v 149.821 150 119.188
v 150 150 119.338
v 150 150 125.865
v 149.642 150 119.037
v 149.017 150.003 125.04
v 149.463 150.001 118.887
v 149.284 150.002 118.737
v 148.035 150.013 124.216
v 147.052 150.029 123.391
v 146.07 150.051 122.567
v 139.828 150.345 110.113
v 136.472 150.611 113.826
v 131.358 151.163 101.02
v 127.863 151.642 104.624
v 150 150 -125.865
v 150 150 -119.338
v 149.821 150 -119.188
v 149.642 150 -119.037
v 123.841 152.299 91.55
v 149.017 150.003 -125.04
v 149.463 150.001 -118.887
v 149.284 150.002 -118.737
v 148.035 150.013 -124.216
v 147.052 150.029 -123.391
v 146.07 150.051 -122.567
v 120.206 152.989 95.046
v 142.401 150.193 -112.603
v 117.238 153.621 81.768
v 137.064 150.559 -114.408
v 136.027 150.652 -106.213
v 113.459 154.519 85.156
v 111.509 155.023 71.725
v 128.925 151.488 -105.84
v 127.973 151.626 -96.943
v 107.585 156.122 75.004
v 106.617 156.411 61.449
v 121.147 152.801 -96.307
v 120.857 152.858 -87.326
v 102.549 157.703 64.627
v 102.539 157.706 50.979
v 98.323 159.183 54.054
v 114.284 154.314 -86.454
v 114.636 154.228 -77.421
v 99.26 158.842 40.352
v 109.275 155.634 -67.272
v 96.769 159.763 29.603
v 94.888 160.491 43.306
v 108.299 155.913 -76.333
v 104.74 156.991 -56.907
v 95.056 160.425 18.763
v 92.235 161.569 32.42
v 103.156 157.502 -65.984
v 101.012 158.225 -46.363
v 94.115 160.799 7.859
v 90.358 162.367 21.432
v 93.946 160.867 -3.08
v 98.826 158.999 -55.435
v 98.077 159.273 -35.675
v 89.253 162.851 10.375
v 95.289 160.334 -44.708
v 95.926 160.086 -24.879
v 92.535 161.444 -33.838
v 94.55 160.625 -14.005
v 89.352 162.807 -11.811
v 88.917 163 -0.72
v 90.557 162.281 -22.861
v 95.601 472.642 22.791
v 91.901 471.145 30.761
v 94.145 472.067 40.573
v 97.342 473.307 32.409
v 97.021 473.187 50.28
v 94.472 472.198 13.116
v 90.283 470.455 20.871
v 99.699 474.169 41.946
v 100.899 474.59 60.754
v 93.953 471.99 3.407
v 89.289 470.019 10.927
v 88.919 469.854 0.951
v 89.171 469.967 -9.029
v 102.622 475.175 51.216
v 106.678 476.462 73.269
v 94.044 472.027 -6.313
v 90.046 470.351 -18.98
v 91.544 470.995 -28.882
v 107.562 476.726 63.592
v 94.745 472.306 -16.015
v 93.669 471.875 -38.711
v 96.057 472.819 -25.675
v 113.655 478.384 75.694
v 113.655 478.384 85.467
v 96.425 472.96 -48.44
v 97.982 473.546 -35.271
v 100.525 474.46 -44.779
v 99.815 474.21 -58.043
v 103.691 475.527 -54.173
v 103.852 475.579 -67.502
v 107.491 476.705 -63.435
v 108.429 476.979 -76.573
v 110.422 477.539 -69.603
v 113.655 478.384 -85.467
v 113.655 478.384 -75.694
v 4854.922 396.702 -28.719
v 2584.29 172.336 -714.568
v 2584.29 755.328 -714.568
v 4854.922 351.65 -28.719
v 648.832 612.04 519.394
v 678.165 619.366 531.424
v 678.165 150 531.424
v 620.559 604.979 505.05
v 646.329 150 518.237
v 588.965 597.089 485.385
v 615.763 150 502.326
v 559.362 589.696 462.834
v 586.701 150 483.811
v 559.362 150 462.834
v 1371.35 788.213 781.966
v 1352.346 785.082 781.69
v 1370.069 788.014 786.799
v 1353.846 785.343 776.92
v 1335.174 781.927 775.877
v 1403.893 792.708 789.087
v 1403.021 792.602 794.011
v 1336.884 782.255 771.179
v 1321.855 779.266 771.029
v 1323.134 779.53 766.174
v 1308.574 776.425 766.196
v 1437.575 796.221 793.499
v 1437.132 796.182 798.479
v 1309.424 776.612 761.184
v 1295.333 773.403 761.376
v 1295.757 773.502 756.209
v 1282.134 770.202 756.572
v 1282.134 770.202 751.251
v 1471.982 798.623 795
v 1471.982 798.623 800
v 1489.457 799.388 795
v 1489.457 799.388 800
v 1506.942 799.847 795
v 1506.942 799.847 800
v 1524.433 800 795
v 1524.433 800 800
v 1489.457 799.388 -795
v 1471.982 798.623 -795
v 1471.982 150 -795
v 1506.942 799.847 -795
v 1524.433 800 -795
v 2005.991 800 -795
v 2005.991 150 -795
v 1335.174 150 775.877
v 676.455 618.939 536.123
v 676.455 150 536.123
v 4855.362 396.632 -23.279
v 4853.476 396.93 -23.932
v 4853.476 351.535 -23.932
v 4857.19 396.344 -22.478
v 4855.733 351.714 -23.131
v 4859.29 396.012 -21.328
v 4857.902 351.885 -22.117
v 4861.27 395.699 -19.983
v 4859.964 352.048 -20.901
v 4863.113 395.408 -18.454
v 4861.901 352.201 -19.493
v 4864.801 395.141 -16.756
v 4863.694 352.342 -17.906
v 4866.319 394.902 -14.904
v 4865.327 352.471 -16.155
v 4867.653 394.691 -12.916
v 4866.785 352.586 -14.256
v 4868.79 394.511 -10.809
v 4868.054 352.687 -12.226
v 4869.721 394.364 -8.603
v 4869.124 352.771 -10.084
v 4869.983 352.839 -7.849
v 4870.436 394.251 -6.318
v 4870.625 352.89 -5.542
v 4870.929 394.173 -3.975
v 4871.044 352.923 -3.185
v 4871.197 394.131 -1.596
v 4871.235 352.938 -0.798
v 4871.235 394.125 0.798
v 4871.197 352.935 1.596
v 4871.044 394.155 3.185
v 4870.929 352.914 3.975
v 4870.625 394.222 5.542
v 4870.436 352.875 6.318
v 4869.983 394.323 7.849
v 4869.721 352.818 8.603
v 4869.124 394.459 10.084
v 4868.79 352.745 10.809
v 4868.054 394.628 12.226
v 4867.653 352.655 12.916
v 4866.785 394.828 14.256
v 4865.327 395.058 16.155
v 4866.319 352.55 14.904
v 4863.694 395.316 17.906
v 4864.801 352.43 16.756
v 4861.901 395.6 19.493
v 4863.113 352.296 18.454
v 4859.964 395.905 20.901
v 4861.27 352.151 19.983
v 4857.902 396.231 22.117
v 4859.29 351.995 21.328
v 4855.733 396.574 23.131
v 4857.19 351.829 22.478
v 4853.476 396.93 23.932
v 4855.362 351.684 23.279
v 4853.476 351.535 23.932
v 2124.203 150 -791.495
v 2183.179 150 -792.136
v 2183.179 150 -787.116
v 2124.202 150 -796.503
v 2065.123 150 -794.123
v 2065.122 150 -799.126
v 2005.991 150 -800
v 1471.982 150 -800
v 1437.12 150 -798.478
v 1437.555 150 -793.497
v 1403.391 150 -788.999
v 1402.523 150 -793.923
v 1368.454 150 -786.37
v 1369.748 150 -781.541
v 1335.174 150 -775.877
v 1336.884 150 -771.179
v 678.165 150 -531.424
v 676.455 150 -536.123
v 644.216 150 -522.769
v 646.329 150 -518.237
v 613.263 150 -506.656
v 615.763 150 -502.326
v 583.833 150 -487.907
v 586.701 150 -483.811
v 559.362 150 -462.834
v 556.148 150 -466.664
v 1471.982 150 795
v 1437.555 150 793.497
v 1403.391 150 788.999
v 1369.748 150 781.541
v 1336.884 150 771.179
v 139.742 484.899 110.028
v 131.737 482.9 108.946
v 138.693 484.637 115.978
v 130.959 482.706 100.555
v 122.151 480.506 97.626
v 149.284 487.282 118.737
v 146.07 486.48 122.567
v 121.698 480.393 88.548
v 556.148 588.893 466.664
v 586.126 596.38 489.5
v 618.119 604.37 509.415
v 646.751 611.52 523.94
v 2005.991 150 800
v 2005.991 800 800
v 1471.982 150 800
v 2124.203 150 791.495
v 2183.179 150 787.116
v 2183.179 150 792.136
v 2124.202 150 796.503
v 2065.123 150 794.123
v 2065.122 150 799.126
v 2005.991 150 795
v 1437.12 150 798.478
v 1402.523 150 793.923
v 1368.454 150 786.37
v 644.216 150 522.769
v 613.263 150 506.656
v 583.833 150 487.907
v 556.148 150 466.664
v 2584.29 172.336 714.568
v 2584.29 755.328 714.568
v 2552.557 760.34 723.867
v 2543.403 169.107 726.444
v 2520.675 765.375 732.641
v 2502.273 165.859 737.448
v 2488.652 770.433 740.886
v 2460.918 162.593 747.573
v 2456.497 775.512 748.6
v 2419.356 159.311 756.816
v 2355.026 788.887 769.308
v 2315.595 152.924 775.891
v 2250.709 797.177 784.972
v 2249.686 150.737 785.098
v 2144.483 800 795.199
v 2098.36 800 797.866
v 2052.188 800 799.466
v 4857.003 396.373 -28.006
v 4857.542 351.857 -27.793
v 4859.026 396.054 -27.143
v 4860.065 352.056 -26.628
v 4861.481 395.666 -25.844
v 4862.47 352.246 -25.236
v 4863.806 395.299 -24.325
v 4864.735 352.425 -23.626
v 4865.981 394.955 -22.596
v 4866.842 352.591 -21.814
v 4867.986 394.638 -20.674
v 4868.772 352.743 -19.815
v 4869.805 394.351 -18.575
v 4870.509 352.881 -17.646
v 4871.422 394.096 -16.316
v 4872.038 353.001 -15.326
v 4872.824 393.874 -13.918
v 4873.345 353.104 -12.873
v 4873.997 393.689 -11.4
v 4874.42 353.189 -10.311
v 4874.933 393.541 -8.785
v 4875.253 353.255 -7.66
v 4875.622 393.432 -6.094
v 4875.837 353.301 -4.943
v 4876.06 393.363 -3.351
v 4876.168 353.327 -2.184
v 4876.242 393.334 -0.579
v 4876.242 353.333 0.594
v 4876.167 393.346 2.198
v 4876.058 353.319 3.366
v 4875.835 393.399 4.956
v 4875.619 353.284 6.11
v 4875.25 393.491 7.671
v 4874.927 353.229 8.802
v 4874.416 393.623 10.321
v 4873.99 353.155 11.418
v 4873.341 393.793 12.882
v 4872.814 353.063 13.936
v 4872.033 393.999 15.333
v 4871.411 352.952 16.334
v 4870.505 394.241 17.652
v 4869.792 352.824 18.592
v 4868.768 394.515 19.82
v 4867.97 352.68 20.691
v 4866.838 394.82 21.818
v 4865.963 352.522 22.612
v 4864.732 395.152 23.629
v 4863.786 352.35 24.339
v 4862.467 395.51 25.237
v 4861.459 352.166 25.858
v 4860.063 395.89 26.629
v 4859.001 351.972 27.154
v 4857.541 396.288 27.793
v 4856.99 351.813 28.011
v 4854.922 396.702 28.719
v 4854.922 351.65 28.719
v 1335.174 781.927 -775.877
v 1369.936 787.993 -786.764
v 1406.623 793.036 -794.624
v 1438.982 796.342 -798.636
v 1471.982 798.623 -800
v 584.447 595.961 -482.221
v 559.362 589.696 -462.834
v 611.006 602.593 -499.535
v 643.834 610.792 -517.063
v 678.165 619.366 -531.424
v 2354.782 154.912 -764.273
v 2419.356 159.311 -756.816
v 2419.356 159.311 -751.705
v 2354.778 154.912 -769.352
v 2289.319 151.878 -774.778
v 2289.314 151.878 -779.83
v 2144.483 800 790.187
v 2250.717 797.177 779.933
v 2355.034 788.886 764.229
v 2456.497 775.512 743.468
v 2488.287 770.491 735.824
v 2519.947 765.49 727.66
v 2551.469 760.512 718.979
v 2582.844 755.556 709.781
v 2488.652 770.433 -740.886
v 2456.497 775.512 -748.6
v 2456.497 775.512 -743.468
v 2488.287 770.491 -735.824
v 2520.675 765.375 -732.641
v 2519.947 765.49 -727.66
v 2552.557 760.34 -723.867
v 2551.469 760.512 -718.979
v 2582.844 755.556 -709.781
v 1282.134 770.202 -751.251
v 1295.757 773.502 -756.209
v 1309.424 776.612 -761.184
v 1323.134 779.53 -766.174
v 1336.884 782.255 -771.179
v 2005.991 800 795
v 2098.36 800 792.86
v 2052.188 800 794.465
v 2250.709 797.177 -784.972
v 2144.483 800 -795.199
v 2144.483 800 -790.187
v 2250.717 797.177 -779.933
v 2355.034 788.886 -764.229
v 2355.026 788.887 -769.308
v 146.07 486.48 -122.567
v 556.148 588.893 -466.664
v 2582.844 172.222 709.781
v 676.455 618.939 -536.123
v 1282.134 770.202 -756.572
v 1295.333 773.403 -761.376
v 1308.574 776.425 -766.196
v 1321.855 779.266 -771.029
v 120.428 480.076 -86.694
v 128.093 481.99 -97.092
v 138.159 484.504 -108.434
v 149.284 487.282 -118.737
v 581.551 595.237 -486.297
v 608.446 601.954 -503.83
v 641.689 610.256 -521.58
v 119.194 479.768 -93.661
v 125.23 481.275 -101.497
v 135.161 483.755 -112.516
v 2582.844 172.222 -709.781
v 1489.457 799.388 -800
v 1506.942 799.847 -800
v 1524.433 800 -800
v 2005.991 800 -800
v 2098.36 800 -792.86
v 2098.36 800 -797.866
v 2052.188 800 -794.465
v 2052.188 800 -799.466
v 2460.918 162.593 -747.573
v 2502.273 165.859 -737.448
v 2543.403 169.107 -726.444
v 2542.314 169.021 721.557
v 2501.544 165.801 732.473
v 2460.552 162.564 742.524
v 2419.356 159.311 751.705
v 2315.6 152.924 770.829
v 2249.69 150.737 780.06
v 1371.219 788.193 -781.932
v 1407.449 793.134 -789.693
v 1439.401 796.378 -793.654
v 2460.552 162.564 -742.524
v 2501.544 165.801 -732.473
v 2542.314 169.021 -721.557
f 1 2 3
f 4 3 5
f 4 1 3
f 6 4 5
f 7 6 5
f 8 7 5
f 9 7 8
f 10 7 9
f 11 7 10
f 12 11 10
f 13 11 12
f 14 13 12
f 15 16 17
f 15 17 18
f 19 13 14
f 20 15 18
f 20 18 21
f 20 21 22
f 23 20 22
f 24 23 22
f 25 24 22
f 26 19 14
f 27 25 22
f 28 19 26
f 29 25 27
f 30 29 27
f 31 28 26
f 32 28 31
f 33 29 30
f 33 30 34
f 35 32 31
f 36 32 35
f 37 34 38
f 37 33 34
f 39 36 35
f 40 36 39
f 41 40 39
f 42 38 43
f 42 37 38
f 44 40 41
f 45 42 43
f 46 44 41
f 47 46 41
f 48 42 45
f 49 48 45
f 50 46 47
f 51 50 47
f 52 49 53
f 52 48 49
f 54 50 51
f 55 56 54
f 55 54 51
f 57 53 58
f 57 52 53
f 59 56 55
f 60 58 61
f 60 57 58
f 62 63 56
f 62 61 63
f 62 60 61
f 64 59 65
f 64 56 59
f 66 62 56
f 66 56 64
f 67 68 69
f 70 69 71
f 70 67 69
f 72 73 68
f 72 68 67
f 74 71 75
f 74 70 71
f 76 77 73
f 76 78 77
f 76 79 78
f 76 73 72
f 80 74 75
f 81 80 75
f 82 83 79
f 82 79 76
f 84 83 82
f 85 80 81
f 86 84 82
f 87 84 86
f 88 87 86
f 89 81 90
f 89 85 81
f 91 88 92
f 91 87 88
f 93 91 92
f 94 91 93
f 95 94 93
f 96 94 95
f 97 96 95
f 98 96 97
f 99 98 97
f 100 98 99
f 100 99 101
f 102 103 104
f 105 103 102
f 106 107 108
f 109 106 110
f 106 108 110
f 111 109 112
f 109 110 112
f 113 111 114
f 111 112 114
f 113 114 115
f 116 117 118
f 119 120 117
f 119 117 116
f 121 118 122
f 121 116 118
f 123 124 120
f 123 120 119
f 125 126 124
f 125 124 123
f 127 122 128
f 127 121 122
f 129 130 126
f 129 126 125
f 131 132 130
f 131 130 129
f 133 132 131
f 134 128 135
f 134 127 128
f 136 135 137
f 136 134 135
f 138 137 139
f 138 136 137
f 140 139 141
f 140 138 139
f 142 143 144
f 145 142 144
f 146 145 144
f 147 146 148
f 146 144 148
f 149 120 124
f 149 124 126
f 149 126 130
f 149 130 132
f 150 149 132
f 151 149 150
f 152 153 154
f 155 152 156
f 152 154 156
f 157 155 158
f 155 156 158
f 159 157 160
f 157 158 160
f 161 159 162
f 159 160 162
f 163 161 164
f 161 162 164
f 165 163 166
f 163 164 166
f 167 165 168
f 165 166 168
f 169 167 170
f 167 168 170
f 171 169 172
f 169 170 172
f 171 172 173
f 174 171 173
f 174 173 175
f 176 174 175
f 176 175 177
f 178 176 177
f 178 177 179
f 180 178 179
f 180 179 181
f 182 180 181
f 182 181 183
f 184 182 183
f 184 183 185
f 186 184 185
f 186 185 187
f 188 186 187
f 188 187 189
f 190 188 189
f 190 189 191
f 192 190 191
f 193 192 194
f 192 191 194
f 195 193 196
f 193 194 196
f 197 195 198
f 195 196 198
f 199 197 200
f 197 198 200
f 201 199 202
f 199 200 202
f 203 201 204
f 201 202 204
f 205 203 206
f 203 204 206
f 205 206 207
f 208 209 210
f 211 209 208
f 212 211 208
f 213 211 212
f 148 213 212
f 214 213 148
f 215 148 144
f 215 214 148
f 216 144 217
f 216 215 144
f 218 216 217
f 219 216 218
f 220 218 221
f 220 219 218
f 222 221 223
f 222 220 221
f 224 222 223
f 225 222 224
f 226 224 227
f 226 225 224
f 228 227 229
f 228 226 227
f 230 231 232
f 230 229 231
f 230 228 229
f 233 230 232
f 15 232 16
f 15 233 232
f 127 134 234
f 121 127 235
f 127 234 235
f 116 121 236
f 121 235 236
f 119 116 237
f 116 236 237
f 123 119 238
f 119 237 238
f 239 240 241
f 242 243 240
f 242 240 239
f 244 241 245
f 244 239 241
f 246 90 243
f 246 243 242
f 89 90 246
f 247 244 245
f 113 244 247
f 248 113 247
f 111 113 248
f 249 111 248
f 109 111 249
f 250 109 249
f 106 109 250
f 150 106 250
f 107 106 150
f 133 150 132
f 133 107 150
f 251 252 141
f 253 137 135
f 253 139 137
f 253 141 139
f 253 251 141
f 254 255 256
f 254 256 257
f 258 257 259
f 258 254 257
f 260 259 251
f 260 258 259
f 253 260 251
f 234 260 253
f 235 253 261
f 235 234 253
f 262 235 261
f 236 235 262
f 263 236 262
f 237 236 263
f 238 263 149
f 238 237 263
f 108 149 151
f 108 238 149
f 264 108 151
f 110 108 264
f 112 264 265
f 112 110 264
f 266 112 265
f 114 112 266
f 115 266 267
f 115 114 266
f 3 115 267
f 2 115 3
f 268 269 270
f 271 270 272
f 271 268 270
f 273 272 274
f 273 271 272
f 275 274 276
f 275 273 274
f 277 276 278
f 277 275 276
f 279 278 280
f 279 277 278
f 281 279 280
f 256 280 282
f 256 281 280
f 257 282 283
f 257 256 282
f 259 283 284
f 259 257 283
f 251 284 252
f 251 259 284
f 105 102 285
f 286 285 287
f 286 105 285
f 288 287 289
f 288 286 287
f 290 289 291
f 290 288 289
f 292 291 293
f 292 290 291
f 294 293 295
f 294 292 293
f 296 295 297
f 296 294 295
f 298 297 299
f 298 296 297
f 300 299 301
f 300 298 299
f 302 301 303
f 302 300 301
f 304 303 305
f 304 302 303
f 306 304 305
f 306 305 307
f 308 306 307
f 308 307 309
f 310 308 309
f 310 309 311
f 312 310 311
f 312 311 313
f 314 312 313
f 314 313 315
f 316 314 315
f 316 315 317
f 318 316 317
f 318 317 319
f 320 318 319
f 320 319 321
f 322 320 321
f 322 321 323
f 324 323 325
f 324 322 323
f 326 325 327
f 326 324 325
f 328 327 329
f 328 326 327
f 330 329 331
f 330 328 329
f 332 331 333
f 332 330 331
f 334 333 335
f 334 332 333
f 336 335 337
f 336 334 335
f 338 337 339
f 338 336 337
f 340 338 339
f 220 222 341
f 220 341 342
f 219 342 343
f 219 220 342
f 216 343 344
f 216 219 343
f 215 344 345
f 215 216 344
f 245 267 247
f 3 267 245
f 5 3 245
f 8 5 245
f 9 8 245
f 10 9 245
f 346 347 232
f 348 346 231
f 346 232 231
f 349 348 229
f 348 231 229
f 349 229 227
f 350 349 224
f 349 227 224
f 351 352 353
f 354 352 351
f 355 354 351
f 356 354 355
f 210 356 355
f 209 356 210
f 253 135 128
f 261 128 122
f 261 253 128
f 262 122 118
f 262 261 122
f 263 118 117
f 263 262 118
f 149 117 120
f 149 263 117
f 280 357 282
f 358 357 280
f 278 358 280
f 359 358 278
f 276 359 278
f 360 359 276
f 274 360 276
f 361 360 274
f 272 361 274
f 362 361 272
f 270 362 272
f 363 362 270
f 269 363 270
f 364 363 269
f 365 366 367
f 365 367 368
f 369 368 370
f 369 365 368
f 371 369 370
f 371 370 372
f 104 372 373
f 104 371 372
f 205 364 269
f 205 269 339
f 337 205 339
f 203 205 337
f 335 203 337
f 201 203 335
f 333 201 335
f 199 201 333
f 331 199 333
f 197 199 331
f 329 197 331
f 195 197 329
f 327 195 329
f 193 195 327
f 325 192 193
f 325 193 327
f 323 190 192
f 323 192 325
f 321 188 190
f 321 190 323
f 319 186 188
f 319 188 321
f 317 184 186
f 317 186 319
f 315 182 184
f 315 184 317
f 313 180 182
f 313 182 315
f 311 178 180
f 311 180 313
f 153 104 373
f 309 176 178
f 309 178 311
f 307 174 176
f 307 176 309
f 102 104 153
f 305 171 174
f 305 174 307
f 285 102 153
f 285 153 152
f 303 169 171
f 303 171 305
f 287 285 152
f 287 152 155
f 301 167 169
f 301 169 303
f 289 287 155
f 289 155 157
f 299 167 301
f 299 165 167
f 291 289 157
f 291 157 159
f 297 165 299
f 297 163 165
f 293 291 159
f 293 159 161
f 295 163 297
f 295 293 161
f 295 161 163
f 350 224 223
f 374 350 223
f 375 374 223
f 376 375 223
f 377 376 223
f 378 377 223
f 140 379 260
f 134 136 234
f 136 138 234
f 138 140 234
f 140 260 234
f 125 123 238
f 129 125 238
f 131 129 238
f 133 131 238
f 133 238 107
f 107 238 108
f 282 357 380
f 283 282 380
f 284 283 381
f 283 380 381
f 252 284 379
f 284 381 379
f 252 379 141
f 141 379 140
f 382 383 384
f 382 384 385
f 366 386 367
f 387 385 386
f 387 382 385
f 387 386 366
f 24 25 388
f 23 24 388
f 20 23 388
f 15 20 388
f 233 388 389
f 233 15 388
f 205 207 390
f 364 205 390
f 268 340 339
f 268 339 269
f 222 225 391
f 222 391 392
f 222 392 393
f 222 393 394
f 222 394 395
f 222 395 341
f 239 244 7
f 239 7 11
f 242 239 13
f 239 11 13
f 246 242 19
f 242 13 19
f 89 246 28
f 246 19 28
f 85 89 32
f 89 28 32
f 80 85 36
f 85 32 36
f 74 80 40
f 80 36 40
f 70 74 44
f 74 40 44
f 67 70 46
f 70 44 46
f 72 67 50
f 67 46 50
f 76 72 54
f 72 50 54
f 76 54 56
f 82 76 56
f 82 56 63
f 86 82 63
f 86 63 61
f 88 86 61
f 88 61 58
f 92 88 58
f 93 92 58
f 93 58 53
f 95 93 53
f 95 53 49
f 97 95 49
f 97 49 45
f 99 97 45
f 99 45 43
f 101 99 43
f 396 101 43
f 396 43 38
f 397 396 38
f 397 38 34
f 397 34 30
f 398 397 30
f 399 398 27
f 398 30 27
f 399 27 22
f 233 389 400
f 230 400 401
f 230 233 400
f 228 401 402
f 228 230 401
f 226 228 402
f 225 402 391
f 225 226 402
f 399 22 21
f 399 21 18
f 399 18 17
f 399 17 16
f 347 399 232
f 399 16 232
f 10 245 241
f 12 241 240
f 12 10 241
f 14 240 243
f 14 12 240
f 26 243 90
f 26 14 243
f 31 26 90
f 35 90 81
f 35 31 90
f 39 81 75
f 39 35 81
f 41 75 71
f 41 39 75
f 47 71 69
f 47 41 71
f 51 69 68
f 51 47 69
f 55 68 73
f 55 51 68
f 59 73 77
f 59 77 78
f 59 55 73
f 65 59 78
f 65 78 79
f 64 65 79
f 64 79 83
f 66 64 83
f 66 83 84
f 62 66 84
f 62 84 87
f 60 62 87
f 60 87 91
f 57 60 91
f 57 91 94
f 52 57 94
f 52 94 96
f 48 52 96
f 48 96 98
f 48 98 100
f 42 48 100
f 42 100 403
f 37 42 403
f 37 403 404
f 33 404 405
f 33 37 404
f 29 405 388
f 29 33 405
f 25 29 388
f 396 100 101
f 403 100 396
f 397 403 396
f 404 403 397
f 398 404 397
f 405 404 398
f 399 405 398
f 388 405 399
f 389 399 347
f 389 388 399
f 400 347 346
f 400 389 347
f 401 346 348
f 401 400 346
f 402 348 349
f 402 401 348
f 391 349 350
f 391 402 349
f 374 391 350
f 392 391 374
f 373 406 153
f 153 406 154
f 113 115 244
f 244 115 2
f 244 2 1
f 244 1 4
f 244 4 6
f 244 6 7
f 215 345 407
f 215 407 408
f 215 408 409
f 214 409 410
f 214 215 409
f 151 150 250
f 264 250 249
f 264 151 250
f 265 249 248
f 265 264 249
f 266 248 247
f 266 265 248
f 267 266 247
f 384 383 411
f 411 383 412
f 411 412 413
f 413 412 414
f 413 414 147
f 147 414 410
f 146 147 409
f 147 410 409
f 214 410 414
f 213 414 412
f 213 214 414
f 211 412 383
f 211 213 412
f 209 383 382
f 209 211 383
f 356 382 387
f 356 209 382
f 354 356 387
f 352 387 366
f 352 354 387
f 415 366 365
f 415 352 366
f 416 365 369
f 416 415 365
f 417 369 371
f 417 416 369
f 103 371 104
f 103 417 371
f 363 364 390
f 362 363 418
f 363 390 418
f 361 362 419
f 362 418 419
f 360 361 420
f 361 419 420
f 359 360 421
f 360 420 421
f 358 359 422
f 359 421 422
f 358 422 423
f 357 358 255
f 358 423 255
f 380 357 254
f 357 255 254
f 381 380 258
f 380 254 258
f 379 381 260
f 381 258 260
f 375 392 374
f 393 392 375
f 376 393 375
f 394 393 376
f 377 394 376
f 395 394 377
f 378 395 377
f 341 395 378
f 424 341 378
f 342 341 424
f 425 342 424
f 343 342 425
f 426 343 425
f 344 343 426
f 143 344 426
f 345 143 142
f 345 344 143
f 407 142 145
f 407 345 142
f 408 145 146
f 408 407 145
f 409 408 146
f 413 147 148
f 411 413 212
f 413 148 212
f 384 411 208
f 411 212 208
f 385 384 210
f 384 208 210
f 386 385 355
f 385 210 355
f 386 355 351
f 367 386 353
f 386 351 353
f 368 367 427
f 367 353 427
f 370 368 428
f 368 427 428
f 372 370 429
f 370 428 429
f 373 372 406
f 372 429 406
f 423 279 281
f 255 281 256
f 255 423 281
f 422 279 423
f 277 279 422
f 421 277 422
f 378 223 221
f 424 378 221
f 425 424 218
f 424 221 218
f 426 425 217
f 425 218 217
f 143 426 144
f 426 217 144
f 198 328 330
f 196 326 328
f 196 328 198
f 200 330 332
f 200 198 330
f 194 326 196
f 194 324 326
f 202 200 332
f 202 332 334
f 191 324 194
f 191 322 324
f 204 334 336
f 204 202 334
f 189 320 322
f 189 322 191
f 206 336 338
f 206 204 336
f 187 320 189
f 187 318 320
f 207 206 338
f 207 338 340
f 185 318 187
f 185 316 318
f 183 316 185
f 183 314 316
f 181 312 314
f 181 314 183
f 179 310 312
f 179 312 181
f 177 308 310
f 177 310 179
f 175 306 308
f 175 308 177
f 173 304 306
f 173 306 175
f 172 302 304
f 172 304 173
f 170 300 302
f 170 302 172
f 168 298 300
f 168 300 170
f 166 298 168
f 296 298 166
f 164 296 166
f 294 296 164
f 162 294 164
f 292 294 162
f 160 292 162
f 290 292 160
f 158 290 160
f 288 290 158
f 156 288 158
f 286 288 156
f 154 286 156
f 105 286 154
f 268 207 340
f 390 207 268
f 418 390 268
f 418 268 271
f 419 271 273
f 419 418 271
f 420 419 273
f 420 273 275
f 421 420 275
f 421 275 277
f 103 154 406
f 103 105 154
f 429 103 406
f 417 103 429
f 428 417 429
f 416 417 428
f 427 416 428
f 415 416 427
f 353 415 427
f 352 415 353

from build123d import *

# Parameters (mm, degrees)
TOPVIEW_EXTRUDE_DEPTH      = 800
SHELL1_T                   = -5
SIDEPROFILE_CUT_DEPTH      = 5006.775642449
SIDEPROFILE_CUT_DEPTH_BACK = 5006.775642449
SKETCH2_OUTSIDE_W          = 5811.458
SKETCH2_OUTSIDE_H          = 1824.126


with BuildPart() as part:
    # Sketch1 → TopView_Extrude (new body)
    with BuildSketch(Plane(origin=(0, 0, 0), x_dir=(1, 0, 0), z_dir=(0, 1, 0))):
        with BuildLine():
            Line((146.069849076, 122.567124227), (556.148324977, 466.663731547))
            ThreePointArc((556.148324977, 466.663731547), (613.263316637, 506.656075273), (676.455195963, 536.122941687))
            Line((676.455195963, 536.122941687), (1335.173700718, 775.877020708))
            ThreePointArc((1335.173700718, 775.877020708), (1402.522523085, 793.923094197), (1471.981833896, 800))
            Line((1471.981833896, 800), (2005.990858989, 800))
            ThreePointArc((2005.990858989, 800), (2298.278743763, 778.526672151), (2584.290234961, 714.567792414))
            Line((2584.290234961, 714.567792414), (4854.922001024, 28.718516886))
            ThreePointArc((4854.922001024, 28.718516886), (4876.247510385, 0), (4854.922001024, -28.718516886))
            Line((4854.922001024, -28.718516886), (2584.290234961, -714.567792414))
            ThreePointArc((2584.290234961, -714.567792414), (2298.278743763, -778.526672151), (2005.990858989, -800))
            Line((2005.990858989, -800), (1471.981833896, -800))
            ThreePointArc((1471.981833896, -800), (1402.522523085, -793.923094197), (1335.173700718, -775.877020708))
            Line((1335.173700718, -775.877020708), (676.455195963, -536.122941687))
            ThreePointArc((676.455195963, -536.122941687), (613.263316637, -506.656075273), (556.148324977, -466.663731547))
            Line((556.148324977, -466.663731547), (146.069849076, -122.567124227))
            ThreePointArc((146.069849076, -122.567124227), (88.915850742, 0), (146.069849076, 122.567124227))
        make_face()
    extrude(amount=TOPVIEW_EXTRUDE_DEPTH)

    # Shell1
    shell1_openings = [part.faces().sort_by_distance(p)[0] for p in [
        (2164.572912822, 800, 0),
        (2164.572912822, 0, 0),
    ]]
    offset(amount=SHELL1_T, openings=shell1_openings, kind=Kind.INTERSECTION)

    # Sketch2 outside → SideProfile_Cut (cut, two sides: drawn at the far end of the back side and taken through both)
    with BuildSketch(Plane.XY.offset(-SIDEPROFILE_CUT_DEPTH_BACK)):
        with Locations((2482.582, 400)):
            Rectangle(SKETCH2_OUTSIDE_W, SKETCH2_OUTSIDE_H)
        with BuildLine():
            Line((0, 300), (0, 332.854125267))
            ThreePointArc((0, 332.854125267), (31.780430043, 425.180358155), (113.65511039, 478.384359237))
            Line((113.65511039, 478.384359237), (1282.133703367, 770.201559797))
            ThreePointArc((1282.133703367, 770.201559797), (1402.370605908, 792.522432945), (1524.432967436, 800))
            Line((1524.432967436, 800), (2144.482683126, 800))
            ThreePointArc((2144.482683126, 800), (2300.969778196, 793.868548595), (2456.497380248, 775.511789076))
            Line((2456.497380248, 775.511789076), (4950, 381.685))
            Line((4950, 381.685), (4950, 359.158))
            Line((4950, 359.158), (2419.355991101, 159.311049986))
            ThreePointArc((2419.355991101, 159.311049986), (2301.359194606, 152.328666278), (2183.178929847, 150))
            Line((2183.178929847, 150), (150, 150))
            ThreePointArc((150, 150), (43.933982822, 193.933982822), (0, 300))
        make_face(mode=Mode.SUBTRACT)
    extrude(amount=SIDEPROFILE_CUT_DEPTH + SIDEPROFILE_CUT_DEPTH_BACK, mode=Mode.SUBTRACT)


solid = part.part
